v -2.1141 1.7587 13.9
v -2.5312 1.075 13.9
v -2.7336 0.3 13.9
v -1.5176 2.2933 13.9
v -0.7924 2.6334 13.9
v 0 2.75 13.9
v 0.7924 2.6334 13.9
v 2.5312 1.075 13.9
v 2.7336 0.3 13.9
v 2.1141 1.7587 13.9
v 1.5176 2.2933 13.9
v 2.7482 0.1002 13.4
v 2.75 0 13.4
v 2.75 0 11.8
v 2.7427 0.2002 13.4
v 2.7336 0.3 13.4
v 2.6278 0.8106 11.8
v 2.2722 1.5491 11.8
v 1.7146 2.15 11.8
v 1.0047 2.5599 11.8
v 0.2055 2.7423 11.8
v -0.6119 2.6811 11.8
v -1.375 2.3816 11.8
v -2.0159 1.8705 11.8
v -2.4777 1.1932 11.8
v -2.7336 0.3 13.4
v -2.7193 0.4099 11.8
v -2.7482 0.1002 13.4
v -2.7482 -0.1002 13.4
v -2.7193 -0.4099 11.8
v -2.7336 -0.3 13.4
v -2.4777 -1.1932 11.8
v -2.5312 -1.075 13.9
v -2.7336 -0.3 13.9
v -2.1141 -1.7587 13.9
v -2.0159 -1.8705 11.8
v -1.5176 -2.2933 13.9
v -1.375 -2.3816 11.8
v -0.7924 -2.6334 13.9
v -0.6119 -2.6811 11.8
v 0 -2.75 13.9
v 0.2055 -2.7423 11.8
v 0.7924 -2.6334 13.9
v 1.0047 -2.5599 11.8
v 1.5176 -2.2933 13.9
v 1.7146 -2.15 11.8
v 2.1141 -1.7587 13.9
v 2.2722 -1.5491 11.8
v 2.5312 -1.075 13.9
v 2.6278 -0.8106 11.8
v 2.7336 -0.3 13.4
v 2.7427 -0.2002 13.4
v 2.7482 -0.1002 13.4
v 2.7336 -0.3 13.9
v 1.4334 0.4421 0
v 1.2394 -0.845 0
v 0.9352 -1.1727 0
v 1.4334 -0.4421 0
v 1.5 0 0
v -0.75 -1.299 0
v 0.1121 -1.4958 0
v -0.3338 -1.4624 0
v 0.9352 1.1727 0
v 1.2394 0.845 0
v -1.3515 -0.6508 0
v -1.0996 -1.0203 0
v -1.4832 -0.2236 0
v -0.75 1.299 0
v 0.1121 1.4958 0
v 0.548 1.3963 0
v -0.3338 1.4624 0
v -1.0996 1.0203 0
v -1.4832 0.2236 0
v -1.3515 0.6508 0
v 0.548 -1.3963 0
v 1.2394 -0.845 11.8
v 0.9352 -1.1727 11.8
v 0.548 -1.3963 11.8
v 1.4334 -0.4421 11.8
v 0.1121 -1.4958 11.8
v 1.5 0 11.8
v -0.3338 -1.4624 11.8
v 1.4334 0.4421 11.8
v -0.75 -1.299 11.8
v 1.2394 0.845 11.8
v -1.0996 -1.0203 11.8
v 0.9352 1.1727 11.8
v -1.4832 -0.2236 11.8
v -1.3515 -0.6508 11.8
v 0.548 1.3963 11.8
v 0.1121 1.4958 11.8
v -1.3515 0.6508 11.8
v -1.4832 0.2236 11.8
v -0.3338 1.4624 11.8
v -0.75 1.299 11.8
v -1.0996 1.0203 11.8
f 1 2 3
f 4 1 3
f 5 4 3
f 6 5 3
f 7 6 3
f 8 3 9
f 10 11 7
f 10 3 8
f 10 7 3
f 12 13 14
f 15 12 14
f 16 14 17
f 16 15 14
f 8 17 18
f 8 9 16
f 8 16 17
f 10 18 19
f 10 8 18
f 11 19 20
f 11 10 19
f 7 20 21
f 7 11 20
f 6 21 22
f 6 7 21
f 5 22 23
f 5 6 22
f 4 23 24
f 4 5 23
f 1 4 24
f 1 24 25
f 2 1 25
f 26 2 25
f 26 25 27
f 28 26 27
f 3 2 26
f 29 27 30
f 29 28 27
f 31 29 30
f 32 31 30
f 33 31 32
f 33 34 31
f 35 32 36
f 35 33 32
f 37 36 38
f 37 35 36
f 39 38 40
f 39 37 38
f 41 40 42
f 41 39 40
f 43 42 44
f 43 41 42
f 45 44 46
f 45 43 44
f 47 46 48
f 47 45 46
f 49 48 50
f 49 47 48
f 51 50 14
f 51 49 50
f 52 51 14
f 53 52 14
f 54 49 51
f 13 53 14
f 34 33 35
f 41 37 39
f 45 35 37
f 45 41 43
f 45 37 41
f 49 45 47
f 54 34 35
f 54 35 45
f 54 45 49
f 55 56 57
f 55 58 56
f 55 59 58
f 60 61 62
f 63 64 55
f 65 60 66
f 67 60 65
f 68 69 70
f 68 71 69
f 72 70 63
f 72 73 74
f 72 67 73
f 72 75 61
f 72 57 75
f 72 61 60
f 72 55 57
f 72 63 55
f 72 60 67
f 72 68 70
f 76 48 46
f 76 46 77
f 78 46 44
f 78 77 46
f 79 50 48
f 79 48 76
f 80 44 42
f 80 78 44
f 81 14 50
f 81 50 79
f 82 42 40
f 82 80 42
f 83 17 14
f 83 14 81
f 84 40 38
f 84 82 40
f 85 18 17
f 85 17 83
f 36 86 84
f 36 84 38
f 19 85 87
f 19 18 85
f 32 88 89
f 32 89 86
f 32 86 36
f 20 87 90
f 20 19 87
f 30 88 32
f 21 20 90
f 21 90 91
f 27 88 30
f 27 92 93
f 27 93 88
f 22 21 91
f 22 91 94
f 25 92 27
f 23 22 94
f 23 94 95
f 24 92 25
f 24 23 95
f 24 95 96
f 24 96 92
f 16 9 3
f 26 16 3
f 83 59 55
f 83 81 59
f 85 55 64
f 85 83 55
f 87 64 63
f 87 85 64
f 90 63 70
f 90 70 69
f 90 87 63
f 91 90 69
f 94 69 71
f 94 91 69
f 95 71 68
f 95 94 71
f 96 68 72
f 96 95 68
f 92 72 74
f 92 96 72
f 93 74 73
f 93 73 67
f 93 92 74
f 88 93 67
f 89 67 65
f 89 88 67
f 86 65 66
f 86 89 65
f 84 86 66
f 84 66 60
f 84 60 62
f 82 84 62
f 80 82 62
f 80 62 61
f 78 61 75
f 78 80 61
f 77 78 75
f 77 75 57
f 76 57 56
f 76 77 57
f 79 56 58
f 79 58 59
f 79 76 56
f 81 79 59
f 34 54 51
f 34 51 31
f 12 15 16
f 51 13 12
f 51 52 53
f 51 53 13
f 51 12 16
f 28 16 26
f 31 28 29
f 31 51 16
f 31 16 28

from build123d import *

# Parameters (mm, degrees)
SKETCH_W     = 5.867174
SKETCH_H     = 0.6
POCKET_DEPTH = 0.5


with BuildPart() as part:
    # Sketch001 → Revolution (revolve)
    with BuildSketch(Plane.XZ):
        Polygon((0, 0), (1.5, 0), (1.5, 11.8), (2.75, 11.8), (2.75, 13.9), (0, 13.9), align=None)
    revolve(axis=Axis((0, 0, 0), (0, 0, 1)))

    # Sketch → Pocket (cut)
    with BuildSketch(Plane(origin=(0, 0, 13.9), x_dir=(-1, 0, 0), z_dir=(0, 0, 1))):
        Rectangle(SKETCH_W, SKETCH_H)
    extrude(amount=-POCKET_DEPTH, mode=Mode.SUBTRACT)


solid = part.part
